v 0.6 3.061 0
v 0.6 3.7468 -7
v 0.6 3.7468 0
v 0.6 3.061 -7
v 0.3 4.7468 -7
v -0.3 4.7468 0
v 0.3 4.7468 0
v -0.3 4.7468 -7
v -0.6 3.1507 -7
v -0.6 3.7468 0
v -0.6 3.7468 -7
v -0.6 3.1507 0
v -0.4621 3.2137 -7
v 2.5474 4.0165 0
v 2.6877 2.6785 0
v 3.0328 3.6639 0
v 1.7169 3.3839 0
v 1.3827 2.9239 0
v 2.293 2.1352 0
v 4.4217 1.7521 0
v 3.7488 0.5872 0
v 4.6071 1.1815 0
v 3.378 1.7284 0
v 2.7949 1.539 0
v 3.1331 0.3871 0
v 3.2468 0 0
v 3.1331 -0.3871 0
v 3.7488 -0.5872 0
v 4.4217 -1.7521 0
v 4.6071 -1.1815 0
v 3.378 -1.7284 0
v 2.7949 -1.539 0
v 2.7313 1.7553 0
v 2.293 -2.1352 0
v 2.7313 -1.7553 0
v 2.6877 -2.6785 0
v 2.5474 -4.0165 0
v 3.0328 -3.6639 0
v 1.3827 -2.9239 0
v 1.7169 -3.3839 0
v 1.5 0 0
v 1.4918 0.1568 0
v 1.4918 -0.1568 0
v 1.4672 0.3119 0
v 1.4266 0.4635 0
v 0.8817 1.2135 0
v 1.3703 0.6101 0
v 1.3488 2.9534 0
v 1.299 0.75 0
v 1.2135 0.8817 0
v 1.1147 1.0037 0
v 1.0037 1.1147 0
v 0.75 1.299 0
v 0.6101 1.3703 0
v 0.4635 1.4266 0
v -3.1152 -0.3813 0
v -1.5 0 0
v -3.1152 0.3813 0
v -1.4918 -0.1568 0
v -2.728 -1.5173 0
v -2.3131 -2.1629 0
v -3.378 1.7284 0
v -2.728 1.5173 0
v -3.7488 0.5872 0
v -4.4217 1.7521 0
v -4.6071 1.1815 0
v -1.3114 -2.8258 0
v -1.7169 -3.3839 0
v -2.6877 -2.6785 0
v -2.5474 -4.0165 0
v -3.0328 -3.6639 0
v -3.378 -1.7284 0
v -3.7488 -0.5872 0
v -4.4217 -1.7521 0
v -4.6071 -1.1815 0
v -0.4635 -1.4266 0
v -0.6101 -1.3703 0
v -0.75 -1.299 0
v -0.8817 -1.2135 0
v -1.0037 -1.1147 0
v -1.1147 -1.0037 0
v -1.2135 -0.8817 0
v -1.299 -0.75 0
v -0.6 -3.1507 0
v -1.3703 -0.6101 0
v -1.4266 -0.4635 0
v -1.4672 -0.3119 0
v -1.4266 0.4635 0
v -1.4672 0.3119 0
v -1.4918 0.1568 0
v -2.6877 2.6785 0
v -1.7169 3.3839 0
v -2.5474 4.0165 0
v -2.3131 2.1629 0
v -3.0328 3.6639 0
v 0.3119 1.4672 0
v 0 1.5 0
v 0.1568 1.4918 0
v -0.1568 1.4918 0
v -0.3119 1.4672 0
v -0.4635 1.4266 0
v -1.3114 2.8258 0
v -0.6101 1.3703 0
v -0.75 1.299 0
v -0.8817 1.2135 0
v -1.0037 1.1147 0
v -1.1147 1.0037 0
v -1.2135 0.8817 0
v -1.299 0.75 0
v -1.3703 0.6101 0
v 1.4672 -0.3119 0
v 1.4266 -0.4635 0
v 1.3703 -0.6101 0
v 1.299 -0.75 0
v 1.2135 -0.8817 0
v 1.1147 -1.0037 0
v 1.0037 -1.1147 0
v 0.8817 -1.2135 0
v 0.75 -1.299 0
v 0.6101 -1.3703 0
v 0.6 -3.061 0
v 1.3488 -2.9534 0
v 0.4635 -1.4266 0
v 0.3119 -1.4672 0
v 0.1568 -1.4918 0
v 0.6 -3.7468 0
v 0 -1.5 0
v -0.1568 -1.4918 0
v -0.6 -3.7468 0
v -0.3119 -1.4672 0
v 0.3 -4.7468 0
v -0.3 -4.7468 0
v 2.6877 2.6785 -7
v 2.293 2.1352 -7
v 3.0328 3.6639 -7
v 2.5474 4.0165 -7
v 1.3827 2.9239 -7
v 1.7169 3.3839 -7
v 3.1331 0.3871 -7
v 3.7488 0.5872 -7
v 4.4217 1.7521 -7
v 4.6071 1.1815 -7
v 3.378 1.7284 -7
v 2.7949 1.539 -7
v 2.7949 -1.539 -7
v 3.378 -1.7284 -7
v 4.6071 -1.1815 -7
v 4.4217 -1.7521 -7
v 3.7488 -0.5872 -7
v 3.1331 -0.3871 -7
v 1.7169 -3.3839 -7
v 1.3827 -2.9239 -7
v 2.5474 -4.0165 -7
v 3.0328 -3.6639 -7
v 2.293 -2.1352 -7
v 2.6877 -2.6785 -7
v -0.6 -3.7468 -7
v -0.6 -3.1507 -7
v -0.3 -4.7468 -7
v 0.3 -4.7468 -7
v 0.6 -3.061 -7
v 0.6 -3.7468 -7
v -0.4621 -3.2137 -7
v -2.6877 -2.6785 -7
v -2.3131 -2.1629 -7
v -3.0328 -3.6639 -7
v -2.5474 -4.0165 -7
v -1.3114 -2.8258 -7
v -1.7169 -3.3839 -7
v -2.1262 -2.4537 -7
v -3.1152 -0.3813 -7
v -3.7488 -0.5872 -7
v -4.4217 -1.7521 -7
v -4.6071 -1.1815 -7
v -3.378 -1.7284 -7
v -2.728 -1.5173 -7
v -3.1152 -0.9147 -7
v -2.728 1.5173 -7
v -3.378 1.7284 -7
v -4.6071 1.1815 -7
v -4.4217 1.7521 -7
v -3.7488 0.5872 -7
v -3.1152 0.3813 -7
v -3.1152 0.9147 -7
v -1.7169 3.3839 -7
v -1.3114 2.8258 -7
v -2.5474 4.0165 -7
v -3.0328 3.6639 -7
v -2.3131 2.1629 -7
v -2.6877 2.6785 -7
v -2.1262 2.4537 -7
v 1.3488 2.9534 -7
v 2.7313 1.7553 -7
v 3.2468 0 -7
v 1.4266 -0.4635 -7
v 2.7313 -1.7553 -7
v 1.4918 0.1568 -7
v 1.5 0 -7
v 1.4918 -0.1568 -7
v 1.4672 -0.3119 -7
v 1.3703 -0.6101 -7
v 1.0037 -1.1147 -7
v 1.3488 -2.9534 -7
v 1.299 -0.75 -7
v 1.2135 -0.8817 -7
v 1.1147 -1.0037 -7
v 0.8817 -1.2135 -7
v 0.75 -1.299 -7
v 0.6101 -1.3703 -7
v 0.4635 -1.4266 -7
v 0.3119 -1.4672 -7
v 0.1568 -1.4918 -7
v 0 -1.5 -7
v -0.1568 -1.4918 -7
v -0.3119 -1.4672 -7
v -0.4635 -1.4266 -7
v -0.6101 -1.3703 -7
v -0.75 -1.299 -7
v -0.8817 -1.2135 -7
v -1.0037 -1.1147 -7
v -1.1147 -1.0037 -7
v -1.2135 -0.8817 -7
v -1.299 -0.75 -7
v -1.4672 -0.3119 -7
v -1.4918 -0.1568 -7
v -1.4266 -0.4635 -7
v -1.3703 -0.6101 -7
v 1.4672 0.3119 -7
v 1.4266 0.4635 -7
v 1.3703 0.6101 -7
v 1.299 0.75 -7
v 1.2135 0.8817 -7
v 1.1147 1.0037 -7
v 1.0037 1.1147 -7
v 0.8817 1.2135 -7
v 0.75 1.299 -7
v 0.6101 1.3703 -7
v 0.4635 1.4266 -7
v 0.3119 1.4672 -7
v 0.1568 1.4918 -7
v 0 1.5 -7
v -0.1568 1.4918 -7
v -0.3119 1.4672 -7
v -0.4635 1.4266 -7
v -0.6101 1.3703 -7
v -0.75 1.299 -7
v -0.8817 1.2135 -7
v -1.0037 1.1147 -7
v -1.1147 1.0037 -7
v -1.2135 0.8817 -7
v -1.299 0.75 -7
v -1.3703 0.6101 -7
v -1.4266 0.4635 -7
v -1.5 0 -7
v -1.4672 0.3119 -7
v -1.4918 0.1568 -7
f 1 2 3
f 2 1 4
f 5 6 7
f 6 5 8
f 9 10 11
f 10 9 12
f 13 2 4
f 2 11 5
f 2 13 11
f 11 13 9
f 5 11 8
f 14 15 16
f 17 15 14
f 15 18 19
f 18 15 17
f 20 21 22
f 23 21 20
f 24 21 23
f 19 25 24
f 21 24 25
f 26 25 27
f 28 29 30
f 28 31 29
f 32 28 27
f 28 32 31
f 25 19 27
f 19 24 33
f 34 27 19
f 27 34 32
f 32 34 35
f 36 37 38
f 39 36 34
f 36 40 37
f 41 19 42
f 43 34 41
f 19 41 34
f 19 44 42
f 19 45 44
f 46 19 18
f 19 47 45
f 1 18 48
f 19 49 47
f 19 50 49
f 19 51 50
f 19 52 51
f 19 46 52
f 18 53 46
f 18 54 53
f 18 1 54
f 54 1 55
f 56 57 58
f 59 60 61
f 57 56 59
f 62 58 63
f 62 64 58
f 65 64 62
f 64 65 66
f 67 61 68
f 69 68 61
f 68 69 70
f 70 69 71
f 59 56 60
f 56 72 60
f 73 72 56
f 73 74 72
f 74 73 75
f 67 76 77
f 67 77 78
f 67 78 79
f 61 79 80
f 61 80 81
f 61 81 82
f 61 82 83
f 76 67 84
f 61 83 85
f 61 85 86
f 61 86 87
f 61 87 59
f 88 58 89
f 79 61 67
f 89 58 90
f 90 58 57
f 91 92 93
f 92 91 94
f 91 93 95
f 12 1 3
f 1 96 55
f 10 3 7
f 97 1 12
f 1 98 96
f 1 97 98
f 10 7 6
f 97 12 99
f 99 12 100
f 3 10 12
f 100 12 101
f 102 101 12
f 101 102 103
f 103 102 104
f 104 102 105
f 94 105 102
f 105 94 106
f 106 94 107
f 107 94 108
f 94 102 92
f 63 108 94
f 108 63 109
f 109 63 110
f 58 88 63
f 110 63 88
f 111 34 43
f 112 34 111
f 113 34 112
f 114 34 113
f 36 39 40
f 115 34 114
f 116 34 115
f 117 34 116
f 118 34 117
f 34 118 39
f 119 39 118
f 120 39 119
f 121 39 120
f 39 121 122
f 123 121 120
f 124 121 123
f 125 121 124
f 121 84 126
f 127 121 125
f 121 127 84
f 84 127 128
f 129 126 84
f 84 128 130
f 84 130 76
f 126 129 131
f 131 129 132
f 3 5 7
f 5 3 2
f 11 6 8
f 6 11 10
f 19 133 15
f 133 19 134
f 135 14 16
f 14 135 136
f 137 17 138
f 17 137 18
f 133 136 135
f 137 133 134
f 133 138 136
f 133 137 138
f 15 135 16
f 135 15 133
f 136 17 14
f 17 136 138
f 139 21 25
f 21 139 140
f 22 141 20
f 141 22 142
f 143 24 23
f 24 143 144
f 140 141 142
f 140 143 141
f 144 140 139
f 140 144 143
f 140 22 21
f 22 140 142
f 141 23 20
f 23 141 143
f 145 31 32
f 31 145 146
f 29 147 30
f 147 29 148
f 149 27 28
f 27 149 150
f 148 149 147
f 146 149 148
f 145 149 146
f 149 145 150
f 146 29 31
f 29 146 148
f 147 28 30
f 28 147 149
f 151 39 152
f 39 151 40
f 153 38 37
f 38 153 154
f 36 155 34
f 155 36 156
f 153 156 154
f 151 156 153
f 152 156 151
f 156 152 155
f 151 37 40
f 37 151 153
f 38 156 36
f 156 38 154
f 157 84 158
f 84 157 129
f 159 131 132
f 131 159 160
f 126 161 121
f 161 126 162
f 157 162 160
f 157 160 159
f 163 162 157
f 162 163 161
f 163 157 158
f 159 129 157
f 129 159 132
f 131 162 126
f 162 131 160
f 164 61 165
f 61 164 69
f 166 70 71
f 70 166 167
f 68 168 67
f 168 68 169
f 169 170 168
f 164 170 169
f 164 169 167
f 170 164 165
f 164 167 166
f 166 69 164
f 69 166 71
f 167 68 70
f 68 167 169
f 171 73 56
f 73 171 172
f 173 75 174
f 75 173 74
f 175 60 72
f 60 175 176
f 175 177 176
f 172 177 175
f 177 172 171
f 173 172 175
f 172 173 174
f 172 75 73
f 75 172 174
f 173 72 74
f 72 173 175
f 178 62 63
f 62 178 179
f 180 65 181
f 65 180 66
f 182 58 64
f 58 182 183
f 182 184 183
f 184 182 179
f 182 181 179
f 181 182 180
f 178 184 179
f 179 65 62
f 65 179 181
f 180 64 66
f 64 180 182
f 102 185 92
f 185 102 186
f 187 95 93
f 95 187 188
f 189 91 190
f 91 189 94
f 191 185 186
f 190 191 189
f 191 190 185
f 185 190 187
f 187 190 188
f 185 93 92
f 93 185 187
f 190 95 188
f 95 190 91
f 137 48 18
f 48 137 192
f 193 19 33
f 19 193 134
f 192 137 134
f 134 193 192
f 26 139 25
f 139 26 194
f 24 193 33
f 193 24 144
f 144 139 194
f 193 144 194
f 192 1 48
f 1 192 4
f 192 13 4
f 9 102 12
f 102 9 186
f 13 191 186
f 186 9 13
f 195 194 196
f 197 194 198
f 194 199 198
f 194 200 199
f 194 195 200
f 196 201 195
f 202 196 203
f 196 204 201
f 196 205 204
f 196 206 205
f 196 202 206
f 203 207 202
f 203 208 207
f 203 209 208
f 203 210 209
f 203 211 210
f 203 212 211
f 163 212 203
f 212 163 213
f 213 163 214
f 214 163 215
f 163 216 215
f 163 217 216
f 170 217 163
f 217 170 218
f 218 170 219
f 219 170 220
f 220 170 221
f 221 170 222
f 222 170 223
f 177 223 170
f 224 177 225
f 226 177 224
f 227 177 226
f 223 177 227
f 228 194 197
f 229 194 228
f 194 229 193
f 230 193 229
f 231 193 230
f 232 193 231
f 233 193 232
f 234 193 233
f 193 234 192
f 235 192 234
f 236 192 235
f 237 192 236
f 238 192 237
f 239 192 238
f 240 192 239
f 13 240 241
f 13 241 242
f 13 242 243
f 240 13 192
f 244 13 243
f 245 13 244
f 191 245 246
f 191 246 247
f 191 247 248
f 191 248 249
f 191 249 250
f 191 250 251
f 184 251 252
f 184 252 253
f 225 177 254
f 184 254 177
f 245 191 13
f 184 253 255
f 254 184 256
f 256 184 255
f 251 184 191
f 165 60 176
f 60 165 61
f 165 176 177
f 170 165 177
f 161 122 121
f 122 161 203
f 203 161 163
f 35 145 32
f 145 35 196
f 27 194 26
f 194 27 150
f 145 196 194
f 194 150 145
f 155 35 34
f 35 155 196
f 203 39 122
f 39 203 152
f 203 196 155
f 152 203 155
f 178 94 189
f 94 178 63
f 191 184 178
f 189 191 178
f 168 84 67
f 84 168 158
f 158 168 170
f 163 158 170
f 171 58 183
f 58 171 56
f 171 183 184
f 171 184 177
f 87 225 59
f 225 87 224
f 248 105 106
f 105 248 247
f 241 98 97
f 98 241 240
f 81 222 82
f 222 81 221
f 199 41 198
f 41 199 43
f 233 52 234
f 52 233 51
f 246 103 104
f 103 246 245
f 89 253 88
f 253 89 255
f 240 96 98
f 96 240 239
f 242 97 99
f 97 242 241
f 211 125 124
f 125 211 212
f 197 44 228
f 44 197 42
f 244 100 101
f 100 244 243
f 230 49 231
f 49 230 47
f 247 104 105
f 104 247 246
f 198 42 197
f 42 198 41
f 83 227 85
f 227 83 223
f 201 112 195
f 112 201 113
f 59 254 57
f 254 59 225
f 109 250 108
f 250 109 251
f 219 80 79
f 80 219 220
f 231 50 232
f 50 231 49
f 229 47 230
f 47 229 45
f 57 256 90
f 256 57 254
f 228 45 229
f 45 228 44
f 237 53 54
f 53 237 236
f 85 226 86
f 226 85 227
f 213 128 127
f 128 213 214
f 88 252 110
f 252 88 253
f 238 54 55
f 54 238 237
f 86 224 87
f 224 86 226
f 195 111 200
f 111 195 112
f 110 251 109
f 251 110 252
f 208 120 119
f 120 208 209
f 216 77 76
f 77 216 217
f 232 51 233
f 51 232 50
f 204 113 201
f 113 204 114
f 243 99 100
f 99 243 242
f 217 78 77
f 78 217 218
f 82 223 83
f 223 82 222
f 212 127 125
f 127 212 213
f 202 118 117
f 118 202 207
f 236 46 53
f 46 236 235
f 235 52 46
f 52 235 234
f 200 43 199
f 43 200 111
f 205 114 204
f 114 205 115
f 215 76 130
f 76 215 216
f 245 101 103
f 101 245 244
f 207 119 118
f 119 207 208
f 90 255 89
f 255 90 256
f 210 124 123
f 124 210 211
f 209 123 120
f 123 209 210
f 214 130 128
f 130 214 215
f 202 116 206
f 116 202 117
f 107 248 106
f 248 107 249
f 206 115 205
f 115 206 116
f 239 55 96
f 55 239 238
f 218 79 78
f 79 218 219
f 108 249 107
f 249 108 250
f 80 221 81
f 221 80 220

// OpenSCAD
numberOfTeeth = 20;
widthOfTeeth = 4;
heightOfTeeth = 5;
thicknessOfGear = 5;
radiusOfHoleForShaft = 4.242640687;  //If shaft is square, find the square of one side,
sidesOfShaft = 4;                    //multiply by two and then square root that to get radius
//diameter = ((teethNo x 1.7 x teethWidth)/pi)+ 2teethHeight

module tooth(width, thickness, height){
  scale([width/5,thickness/5,height/10]){
    difference(){
      translate([-2.5,0,0])
      cube([5,5,10]);
      translate([5+1.25-2.5,0-1,0])
      rotate([0,-14.0362434,0])
        cube([5,5+2,12]);
      translate([0-1.25-2.5,0+5+1,0])
      rotate([0,-14.0362434,180])
        cube([5,5+2,12]);
    }
  }
}
module gear(toothNo, toothWidth, toothHeight, thickness,holeRadius,holeSides){
  radius = (toothWidth*1.7*toothNo)/3.141592653589793238/2;
  rotate([-90,0,0])
  difference(){
    union(){
      for(i=[0:toothNo]){
        rotate([0,(360/toothNo)*i,0])
        translate([0,0,radius-0.5])
          tooth(toothWidth,thickness,toothHeight);
      }
      translate([0,thickness,0])
      rotate([90,0,0])
        cylinder(r=radius, h=thickness);
    }
  translate([0,thickness+1,0])
  rotate([90,0,0])
    cylinder(r=holeRadius,h=thickness+2,$fn=holeSides);
  }
}

gear(10,1.2,2,7,1.5,60);
